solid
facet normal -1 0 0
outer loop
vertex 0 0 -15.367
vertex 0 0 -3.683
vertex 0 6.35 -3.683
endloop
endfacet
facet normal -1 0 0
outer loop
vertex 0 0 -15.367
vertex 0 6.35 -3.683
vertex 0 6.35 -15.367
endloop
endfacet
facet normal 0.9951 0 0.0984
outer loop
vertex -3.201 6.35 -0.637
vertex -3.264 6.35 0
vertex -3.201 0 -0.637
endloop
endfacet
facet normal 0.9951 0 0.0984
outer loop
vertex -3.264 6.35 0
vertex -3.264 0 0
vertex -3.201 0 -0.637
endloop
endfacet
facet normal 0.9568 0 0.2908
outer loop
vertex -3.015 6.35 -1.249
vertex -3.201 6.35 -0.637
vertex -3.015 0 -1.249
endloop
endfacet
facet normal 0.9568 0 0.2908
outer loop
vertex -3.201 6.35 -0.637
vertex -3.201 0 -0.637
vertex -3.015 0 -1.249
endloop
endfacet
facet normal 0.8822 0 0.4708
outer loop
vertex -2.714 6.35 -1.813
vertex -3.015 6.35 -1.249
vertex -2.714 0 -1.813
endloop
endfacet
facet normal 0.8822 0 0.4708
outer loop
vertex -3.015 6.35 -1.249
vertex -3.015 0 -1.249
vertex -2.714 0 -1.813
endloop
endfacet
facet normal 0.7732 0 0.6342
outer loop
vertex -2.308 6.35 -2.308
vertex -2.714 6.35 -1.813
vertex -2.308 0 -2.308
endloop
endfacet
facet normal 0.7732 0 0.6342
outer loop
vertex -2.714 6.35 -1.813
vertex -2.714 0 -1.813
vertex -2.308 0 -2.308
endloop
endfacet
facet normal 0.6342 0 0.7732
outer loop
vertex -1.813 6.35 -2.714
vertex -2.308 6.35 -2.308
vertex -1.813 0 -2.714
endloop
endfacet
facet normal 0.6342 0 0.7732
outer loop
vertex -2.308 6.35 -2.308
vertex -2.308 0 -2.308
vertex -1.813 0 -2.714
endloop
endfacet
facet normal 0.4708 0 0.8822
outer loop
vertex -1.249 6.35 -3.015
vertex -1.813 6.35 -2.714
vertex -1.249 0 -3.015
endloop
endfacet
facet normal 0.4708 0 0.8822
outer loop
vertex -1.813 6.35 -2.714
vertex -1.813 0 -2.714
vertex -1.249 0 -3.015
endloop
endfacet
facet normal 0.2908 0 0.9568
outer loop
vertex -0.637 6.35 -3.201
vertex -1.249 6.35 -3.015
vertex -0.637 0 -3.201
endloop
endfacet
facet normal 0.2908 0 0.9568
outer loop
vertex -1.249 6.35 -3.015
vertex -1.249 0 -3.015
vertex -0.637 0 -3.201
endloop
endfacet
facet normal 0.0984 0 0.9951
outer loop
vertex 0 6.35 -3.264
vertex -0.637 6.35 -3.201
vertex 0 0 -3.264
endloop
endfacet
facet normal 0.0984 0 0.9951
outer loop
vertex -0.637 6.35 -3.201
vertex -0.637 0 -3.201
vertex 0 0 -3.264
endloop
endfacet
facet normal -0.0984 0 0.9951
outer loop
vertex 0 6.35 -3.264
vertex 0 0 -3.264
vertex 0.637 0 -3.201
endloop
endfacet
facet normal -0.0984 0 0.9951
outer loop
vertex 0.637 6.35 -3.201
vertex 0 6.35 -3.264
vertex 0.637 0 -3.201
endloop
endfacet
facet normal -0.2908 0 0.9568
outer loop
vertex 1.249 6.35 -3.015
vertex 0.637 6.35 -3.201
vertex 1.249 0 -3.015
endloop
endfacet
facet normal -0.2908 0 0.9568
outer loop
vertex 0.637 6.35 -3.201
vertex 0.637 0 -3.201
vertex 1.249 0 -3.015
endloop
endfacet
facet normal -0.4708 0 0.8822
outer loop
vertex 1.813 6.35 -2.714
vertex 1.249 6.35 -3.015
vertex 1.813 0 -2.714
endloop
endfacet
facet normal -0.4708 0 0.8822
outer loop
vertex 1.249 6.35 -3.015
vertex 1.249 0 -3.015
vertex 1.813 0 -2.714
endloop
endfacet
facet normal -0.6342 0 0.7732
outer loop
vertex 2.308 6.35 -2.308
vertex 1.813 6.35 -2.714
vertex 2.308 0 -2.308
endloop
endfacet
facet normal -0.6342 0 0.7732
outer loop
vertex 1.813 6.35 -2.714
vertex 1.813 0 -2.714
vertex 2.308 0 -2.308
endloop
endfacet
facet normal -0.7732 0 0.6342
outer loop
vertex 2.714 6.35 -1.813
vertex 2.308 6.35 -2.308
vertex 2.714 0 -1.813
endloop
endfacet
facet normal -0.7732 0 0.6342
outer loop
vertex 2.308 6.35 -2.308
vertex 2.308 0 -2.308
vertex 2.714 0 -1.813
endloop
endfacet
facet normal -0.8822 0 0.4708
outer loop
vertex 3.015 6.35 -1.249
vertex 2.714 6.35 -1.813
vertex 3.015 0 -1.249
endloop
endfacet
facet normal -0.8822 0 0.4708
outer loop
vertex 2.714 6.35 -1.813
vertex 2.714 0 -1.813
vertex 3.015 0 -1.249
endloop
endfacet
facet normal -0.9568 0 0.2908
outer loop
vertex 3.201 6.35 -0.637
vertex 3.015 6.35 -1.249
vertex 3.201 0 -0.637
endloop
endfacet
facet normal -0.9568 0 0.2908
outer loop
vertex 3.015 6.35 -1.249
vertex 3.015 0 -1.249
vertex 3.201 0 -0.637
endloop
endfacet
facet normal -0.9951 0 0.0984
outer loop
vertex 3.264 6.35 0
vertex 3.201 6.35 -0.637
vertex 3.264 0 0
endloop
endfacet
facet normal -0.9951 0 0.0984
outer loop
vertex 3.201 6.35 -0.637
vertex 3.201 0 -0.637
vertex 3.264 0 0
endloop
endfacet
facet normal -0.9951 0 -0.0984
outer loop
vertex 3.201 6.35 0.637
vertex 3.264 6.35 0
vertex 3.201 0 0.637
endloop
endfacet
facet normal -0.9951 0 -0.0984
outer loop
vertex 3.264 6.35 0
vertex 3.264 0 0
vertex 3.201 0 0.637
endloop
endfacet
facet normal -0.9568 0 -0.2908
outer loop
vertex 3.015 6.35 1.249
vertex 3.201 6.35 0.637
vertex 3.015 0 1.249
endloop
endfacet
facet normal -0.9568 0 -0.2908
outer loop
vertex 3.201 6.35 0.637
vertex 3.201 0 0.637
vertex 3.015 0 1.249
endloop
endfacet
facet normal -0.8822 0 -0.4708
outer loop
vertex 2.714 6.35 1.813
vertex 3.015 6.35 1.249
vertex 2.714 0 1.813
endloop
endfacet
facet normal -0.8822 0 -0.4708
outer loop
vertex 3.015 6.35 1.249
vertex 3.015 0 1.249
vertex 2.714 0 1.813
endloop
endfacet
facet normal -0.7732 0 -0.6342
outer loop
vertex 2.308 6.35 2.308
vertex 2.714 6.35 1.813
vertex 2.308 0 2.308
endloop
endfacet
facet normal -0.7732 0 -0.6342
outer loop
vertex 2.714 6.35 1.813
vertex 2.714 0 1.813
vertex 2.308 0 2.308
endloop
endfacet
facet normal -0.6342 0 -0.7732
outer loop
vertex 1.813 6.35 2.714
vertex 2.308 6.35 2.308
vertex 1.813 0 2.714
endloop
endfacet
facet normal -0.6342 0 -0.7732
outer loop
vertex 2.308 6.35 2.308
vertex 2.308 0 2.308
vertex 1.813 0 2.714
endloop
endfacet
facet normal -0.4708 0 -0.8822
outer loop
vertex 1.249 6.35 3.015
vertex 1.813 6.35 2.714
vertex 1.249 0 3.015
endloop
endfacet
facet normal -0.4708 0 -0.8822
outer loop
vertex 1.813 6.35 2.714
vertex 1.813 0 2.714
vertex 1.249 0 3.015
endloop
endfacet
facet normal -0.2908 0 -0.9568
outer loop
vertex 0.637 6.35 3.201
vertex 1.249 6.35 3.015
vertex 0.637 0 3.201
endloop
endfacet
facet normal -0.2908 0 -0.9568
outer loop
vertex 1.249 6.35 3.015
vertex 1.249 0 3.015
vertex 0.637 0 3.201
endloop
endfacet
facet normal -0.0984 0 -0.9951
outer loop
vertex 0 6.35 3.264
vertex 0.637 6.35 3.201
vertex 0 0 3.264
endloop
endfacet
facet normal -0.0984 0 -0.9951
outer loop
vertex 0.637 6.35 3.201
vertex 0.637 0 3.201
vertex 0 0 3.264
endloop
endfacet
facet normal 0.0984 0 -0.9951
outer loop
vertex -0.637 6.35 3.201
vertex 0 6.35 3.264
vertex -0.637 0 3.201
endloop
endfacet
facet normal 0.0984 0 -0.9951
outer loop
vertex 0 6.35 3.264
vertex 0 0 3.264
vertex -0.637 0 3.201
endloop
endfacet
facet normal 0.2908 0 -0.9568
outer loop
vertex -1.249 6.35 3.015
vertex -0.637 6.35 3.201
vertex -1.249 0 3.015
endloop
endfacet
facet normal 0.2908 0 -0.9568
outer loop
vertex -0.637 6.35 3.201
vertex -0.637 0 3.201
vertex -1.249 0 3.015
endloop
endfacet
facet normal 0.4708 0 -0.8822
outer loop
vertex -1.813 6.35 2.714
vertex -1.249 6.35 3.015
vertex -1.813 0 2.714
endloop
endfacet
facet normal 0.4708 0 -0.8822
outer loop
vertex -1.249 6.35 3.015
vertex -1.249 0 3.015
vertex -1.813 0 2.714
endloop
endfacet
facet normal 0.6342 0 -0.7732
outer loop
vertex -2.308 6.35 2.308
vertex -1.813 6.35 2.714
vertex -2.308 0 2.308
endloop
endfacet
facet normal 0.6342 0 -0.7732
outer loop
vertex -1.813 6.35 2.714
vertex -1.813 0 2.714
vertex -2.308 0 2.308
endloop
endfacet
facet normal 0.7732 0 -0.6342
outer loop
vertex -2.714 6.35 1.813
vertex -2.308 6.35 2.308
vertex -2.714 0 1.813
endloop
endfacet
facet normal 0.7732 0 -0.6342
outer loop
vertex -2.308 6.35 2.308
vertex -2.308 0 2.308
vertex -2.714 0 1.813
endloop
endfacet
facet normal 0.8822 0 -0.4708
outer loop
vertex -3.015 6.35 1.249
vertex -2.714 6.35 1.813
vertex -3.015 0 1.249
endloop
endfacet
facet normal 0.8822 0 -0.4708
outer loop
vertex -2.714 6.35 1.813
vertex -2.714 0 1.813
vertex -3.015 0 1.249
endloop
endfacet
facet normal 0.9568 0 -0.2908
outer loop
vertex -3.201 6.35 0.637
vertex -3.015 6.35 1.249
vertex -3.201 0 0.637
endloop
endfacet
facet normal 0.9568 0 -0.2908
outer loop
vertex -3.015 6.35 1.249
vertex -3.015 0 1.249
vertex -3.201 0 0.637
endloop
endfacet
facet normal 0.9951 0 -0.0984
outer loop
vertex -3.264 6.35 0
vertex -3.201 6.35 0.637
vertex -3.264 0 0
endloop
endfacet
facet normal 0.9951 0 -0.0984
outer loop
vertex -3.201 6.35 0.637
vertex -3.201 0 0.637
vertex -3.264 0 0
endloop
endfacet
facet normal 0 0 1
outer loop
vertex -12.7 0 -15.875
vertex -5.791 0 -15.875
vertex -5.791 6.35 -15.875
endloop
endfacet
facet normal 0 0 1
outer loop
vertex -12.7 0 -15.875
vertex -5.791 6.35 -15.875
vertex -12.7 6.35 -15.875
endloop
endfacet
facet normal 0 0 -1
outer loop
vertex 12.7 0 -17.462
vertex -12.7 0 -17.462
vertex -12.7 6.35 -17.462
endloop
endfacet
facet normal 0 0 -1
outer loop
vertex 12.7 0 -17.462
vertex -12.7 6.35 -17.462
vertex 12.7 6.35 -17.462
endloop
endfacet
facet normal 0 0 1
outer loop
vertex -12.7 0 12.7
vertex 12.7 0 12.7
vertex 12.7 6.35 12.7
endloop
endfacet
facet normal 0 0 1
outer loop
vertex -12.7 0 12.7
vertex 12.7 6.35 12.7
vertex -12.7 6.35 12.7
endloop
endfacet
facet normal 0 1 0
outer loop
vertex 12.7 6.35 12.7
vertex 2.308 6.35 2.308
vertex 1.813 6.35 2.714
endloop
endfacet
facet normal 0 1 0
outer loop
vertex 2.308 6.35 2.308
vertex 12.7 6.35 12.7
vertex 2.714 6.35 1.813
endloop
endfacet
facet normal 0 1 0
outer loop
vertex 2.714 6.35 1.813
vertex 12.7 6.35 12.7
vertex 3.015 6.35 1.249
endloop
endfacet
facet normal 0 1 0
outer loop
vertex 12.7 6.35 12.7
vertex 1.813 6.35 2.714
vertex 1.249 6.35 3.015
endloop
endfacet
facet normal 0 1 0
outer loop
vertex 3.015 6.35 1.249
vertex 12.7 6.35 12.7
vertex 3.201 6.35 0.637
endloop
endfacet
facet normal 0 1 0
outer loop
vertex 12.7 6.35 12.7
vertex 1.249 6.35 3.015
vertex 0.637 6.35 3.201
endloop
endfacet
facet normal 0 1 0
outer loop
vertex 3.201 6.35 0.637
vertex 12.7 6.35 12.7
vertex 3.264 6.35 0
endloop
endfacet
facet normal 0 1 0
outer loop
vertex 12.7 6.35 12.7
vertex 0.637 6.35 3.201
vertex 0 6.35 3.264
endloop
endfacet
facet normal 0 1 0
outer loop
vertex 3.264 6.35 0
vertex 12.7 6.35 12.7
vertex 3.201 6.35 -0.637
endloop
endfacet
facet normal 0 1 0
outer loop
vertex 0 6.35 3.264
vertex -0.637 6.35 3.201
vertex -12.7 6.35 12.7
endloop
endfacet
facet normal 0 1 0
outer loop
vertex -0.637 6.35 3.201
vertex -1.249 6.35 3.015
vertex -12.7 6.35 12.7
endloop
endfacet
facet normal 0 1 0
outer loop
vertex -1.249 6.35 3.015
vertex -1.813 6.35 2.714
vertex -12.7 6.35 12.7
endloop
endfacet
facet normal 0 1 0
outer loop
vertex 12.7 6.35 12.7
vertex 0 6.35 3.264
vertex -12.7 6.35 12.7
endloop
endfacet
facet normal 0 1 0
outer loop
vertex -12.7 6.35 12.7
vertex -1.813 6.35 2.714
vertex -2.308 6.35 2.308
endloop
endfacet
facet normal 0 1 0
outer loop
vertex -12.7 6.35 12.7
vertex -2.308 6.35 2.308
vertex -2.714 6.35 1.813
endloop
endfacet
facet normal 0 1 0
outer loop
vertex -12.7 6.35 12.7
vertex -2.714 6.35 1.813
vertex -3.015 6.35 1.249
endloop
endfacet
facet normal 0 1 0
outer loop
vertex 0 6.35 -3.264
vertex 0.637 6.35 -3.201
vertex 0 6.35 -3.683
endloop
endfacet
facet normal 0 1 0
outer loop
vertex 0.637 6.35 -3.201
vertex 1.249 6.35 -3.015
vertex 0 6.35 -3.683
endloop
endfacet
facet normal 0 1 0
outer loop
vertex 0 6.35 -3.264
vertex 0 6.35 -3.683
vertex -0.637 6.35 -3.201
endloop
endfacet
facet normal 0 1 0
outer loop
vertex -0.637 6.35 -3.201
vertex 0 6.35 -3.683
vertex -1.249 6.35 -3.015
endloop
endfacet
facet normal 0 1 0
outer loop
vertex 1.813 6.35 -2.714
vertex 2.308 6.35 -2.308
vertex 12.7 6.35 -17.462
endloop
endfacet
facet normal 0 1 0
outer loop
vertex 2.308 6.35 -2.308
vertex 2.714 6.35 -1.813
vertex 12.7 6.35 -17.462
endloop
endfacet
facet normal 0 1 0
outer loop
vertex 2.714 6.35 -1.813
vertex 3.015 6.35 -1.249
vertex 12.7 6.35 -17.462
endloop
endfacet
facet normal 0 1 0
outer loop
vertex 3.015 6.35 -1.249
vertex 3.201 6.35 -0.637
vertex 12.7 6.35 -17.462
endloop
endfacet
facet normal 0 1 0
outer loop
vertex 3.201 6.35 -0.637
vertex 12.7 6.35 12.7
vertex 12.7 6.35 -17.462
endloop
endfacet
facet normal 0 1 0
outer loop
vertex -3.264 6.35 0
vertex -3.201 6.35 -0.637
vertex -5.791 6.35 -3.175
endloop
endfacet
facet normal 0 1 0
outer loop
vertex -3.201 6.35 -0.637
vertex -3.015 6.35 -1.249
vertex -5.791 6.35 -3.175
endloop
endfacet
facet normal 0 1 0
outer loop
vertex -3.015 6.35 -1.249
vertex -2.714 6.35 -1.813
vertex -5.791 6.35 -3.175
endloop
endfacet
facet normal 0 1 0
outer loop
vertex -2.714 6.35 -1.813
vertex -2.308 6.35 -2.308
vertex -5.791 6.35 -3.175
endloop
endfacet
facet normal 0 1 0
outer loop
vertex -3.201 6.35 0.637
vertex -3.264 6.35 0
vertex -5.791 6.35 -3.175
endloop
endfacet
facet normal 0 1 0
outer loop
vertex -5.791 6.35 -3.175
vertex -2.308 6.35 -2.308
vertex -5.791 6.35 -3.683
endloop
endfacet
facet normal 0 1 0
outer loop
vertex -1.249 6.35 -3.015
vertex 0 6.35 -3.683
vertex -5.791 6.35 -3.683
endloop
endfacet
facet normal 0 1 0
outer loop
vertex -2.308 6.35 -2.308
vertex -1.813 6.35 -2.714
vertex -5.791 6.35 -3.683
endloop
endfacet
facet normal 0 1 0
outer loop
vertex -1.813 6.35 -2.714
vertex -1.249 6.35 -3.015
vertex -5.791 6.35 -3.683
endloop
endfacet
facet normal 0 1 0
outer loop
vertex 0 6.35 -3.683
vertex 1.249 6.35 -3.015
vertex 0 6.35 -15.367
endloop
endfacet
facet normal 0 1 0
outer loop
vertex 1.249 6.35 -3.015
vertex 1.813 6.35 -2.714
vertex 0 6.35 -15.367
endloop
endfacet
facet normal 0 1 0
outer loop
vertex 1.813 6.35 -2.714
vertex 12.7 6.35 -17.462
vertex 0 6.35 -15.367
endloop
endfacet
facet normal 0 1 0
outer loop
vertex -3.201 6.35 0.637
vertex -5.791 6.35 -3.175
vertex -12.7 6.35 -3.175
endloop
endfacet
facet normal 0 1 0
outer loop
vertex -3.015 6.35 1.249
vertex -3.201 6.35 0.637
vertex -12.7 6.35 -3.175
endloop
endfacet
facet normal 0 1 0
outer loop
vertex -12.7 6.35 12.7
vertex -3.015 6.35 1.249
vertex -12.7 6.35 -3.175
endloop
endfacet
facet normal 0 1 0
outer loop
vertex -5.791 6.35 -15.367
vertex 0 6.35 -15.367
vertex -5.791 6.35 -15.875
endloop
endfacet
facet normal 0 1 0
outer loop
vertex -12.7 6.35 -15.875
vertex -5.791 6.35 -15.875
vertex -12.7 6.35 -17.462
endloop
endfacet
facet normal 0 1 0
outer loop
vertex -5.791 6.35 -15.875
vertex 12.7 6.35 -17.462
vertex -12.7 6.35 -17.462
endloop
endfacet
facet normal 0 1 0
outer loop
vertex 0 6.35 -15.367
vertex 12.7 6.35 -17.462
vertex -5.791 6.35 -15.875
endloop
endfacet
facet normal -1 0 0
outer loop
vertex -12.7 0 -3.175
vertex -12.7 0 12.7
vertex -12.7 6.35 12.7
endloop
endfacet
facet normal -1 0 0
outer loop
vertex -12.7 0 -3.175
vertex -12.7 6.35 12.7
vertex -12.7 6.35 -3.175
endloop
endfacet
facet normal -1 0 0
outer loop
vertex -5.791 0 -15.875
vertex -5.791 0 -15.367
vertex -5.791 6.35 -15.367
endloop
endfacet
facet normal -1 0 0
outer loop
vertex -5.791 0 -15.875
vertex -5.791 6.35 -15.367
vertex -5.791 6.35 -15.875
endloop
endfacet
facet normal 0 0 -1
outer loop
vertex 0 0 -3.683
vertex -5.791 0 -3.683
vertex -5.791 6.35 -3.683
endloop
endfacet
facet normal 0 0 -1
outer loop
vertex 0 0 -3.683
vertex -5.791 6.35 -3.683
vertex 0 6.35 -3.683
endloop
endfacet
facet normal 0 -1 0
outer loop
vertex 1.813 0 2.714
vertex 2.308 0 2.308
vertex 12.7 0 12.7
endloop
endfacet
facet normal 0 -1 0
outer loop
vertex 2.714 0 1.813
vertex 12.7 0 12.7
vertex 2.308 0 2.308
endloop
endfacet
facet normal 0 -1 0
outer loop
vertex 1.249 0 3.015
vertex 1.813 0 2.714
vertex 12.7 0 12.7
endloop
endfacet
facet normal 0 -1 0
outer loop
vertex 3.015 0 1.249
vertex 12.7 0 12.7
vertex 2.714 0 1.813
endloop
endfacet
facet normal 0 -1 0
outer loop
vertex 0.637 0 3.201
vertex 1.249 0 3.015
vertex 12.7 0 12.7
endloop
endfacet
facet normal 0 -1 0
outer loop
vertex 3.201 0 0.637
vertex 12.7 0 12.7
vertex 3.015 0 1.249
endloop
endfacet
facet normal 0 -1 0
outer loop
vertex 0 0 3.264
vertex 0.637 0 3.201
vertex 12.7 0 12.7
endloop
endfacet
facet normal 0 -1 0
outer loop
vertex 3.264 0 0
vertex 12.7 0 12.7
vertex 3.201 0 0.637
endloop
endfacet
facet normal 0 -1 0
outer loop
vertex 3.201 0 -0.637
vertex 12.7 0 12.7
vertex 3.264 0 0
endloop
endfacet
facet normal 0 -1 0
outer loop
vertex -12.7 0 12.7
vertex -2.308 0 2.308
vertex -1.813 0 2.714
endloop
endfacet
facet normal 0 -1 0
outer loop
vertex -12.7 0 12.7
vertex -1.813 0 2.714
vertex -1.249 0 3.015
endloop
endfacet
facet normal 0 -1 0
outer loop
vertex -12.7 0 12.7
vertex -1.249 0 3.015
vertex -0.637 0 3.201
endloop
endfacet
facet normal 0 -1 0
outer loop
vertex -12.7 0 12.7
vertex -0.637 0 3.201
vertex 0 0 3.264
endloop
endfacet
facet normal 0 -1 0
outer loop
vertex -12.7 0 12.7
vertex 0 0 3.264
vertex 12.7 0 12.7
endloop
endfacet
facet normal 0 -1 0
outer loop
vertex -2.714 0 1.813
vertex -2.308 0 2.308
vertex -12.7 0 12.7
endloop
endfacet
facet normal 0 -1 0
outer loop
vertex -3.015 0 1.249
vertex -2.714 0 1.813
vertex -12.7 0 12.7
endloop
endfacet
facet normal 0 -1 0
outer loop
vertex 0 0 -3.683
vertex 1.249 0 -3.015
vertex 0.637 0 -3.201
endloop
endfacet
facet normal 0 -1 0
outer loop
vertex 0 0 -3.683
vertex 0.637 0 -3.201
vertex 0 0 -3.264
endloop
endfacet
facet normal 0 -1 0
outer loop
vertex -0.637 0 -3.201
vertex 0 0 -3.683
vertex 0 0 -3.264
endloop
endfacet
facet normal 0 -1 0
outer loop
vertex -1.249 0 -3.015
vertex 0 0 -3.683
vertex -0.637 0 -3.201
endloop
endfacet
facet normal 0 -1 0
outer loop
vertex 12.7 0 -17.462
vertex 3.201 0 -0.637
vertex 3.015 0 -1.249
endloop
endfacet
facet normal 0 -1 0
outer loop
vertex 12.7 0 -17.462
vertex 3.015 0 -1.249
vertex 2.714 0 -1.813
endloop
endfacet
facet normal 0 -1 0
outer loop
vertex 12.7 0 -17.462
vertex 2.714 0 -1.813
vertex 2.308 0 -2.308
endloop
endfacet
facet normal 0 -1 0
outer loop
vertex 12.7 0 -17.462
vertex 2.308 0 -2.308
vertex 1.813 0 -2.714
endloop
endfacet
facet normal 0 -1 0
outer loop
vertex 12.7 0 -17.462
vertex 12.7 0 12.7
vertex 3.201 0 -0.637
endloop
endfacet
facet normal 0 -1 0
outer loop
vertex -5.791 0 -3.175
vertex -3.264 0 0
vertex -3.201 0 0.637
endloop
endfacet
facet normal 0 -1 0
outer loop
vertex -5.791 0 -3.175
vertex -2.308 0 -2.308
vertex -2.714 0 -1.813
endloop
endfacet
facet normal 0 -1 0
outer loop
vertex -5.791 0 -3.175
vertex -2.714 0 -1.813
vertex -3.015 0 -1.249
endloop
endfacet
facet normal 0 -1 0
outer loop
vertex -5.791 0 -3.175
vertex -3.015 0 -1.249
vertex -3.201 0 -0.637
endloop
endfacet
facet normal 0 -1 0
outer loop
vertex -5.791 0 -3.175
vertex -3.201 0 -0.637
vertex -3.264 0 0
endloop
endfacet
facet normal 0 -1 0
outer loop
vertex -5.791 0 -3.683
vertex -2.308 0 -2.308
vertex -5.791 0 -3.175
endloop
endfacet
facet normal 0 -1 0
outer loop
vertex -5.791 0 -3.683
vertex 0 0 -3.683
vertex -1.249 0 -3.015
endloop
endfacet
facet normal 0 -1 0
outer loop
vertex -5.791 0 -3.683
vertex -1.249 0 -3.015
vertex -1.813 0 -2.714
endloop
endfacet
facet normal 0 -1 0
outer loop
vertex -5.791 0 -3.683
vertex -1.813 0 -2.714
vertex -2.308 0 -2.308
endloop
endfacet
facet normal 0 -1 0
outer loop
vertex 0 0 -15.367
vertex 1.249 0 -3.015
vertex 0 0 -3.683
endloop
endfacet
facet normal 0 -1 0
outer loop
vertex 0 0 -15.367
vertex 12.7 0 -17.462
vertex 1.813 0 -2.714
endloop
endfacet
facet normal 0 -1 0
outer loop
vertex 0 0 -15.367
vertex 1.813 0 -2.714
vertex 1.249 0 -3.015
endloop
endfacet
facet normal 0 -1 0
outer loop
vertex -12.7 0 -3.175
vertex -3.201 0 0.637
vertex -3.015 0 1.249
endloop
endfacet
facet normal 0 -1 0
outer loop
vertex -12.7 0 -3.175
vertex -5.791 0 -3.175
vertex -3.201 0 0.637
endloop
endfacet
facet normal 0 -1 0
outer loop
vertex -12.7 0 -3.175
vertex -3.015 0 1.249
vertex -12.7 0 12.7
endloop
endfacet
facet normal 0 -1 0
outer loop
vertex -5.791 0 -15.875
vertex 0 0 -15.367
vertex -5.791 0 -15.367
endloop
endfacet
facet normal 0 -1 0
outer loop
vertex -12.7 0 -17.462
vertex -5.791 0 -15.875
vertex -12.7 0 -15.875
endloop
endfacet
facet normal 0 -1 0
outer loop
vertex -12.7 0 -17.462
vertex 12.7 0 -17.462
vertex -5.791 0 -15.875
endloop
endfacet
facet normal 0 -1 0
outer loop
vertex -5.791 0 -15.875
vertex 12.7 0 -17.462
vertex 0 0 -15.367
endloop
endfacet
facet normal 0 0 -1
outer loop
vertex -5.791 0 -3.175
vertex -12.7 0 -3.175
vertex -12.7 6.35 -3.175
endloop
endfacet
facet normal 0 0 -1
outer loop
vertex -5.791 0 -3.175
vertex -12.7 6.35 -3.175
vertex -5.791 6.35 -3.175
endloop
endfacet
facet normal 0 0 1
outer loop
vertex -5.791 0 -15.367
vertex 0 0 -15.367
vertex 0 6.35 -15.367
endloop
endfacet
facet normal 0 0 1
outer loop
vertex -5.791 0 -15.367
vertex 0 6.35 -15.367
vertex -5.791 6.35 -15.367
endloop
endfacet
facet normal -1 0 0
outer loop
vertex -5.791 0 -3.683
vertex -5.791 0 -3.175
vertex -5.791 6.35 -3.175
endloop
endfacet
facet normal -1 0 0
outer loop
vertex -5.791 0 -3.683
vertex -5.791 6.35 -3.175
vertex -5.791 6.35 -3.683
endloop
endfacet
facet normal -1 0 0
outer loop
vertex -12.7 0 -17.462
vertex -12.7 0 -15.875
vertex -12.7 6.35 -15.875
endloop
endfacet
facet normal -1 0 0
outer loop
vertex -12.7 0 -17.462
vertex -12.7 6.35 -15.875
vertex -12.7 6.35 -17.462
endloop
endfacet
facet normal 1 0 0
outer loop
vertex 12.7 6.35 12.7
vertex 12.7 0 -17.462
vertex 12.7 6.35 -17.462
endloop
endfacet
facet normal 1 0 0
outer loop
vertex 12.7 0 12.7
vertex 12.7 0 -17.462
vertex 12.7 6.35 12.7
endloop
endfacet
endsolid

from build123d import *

# Parameters (mm, degrees)
BOSS_EXTRUDE1_DEPTH         = 6.35
F_1_4_CLEARANCE_HOLE1_D     = 6.5278
F_1_4_CLEARANCE_HOLE1_DEPTH = 6.35
F_1_4_CLEARANCE_HOLE1_TIP   = 1.961148974


with BuildPart() as part:
    # Sketch2 → Boss-Extrude1 (new body)
    with BuildSketch(Plane(origin=(0, 0, 0), x_dir=(1, 0, 0), z_dir=(0, 1, 0))):
        Polygon((-12.7, 15.875), (-12.7, 17.4625), (12.7, 17.4625), (12.7, -12.7), (-12.7, -12.7), (-12.7, 3.175), (-5.7912, 3.175), (-5.7912, 3.683), (0, 3.683), (0, 15.367), (-5.7912, 15.367), (-5.7912, 15.875), align=None)
    extrude(amount=BOSS_EXTRUDE1_DEPTH)

    # 1/4 Clearance Hole1
    with Locations(Plane(origin=(0, 6.35, 0), x_dir=(1, 0, 0), z_dir=(0, 1, 0))):
        with Locations((0, 0)):
            Hole(F_1_4_CLEARANCE_HOLE1_D / 2, depth=F_1_4_CLEARANCE_HOLE1_DEPTH)
            with Locations((0, 0, -(F_1_4_CLEARANCE_HOLE1_DEPTH + F_1_4_CLEARANCE_HOLE1_TIP / 2))):  # 118° drill point
                Cone(0, F_1_4_CLEARANCE_HOLE1_D / 2, F_1_4_CLEARANCE_HOLE1_TIP, mode=Mode.SUBTRACT)


solid = part.part
